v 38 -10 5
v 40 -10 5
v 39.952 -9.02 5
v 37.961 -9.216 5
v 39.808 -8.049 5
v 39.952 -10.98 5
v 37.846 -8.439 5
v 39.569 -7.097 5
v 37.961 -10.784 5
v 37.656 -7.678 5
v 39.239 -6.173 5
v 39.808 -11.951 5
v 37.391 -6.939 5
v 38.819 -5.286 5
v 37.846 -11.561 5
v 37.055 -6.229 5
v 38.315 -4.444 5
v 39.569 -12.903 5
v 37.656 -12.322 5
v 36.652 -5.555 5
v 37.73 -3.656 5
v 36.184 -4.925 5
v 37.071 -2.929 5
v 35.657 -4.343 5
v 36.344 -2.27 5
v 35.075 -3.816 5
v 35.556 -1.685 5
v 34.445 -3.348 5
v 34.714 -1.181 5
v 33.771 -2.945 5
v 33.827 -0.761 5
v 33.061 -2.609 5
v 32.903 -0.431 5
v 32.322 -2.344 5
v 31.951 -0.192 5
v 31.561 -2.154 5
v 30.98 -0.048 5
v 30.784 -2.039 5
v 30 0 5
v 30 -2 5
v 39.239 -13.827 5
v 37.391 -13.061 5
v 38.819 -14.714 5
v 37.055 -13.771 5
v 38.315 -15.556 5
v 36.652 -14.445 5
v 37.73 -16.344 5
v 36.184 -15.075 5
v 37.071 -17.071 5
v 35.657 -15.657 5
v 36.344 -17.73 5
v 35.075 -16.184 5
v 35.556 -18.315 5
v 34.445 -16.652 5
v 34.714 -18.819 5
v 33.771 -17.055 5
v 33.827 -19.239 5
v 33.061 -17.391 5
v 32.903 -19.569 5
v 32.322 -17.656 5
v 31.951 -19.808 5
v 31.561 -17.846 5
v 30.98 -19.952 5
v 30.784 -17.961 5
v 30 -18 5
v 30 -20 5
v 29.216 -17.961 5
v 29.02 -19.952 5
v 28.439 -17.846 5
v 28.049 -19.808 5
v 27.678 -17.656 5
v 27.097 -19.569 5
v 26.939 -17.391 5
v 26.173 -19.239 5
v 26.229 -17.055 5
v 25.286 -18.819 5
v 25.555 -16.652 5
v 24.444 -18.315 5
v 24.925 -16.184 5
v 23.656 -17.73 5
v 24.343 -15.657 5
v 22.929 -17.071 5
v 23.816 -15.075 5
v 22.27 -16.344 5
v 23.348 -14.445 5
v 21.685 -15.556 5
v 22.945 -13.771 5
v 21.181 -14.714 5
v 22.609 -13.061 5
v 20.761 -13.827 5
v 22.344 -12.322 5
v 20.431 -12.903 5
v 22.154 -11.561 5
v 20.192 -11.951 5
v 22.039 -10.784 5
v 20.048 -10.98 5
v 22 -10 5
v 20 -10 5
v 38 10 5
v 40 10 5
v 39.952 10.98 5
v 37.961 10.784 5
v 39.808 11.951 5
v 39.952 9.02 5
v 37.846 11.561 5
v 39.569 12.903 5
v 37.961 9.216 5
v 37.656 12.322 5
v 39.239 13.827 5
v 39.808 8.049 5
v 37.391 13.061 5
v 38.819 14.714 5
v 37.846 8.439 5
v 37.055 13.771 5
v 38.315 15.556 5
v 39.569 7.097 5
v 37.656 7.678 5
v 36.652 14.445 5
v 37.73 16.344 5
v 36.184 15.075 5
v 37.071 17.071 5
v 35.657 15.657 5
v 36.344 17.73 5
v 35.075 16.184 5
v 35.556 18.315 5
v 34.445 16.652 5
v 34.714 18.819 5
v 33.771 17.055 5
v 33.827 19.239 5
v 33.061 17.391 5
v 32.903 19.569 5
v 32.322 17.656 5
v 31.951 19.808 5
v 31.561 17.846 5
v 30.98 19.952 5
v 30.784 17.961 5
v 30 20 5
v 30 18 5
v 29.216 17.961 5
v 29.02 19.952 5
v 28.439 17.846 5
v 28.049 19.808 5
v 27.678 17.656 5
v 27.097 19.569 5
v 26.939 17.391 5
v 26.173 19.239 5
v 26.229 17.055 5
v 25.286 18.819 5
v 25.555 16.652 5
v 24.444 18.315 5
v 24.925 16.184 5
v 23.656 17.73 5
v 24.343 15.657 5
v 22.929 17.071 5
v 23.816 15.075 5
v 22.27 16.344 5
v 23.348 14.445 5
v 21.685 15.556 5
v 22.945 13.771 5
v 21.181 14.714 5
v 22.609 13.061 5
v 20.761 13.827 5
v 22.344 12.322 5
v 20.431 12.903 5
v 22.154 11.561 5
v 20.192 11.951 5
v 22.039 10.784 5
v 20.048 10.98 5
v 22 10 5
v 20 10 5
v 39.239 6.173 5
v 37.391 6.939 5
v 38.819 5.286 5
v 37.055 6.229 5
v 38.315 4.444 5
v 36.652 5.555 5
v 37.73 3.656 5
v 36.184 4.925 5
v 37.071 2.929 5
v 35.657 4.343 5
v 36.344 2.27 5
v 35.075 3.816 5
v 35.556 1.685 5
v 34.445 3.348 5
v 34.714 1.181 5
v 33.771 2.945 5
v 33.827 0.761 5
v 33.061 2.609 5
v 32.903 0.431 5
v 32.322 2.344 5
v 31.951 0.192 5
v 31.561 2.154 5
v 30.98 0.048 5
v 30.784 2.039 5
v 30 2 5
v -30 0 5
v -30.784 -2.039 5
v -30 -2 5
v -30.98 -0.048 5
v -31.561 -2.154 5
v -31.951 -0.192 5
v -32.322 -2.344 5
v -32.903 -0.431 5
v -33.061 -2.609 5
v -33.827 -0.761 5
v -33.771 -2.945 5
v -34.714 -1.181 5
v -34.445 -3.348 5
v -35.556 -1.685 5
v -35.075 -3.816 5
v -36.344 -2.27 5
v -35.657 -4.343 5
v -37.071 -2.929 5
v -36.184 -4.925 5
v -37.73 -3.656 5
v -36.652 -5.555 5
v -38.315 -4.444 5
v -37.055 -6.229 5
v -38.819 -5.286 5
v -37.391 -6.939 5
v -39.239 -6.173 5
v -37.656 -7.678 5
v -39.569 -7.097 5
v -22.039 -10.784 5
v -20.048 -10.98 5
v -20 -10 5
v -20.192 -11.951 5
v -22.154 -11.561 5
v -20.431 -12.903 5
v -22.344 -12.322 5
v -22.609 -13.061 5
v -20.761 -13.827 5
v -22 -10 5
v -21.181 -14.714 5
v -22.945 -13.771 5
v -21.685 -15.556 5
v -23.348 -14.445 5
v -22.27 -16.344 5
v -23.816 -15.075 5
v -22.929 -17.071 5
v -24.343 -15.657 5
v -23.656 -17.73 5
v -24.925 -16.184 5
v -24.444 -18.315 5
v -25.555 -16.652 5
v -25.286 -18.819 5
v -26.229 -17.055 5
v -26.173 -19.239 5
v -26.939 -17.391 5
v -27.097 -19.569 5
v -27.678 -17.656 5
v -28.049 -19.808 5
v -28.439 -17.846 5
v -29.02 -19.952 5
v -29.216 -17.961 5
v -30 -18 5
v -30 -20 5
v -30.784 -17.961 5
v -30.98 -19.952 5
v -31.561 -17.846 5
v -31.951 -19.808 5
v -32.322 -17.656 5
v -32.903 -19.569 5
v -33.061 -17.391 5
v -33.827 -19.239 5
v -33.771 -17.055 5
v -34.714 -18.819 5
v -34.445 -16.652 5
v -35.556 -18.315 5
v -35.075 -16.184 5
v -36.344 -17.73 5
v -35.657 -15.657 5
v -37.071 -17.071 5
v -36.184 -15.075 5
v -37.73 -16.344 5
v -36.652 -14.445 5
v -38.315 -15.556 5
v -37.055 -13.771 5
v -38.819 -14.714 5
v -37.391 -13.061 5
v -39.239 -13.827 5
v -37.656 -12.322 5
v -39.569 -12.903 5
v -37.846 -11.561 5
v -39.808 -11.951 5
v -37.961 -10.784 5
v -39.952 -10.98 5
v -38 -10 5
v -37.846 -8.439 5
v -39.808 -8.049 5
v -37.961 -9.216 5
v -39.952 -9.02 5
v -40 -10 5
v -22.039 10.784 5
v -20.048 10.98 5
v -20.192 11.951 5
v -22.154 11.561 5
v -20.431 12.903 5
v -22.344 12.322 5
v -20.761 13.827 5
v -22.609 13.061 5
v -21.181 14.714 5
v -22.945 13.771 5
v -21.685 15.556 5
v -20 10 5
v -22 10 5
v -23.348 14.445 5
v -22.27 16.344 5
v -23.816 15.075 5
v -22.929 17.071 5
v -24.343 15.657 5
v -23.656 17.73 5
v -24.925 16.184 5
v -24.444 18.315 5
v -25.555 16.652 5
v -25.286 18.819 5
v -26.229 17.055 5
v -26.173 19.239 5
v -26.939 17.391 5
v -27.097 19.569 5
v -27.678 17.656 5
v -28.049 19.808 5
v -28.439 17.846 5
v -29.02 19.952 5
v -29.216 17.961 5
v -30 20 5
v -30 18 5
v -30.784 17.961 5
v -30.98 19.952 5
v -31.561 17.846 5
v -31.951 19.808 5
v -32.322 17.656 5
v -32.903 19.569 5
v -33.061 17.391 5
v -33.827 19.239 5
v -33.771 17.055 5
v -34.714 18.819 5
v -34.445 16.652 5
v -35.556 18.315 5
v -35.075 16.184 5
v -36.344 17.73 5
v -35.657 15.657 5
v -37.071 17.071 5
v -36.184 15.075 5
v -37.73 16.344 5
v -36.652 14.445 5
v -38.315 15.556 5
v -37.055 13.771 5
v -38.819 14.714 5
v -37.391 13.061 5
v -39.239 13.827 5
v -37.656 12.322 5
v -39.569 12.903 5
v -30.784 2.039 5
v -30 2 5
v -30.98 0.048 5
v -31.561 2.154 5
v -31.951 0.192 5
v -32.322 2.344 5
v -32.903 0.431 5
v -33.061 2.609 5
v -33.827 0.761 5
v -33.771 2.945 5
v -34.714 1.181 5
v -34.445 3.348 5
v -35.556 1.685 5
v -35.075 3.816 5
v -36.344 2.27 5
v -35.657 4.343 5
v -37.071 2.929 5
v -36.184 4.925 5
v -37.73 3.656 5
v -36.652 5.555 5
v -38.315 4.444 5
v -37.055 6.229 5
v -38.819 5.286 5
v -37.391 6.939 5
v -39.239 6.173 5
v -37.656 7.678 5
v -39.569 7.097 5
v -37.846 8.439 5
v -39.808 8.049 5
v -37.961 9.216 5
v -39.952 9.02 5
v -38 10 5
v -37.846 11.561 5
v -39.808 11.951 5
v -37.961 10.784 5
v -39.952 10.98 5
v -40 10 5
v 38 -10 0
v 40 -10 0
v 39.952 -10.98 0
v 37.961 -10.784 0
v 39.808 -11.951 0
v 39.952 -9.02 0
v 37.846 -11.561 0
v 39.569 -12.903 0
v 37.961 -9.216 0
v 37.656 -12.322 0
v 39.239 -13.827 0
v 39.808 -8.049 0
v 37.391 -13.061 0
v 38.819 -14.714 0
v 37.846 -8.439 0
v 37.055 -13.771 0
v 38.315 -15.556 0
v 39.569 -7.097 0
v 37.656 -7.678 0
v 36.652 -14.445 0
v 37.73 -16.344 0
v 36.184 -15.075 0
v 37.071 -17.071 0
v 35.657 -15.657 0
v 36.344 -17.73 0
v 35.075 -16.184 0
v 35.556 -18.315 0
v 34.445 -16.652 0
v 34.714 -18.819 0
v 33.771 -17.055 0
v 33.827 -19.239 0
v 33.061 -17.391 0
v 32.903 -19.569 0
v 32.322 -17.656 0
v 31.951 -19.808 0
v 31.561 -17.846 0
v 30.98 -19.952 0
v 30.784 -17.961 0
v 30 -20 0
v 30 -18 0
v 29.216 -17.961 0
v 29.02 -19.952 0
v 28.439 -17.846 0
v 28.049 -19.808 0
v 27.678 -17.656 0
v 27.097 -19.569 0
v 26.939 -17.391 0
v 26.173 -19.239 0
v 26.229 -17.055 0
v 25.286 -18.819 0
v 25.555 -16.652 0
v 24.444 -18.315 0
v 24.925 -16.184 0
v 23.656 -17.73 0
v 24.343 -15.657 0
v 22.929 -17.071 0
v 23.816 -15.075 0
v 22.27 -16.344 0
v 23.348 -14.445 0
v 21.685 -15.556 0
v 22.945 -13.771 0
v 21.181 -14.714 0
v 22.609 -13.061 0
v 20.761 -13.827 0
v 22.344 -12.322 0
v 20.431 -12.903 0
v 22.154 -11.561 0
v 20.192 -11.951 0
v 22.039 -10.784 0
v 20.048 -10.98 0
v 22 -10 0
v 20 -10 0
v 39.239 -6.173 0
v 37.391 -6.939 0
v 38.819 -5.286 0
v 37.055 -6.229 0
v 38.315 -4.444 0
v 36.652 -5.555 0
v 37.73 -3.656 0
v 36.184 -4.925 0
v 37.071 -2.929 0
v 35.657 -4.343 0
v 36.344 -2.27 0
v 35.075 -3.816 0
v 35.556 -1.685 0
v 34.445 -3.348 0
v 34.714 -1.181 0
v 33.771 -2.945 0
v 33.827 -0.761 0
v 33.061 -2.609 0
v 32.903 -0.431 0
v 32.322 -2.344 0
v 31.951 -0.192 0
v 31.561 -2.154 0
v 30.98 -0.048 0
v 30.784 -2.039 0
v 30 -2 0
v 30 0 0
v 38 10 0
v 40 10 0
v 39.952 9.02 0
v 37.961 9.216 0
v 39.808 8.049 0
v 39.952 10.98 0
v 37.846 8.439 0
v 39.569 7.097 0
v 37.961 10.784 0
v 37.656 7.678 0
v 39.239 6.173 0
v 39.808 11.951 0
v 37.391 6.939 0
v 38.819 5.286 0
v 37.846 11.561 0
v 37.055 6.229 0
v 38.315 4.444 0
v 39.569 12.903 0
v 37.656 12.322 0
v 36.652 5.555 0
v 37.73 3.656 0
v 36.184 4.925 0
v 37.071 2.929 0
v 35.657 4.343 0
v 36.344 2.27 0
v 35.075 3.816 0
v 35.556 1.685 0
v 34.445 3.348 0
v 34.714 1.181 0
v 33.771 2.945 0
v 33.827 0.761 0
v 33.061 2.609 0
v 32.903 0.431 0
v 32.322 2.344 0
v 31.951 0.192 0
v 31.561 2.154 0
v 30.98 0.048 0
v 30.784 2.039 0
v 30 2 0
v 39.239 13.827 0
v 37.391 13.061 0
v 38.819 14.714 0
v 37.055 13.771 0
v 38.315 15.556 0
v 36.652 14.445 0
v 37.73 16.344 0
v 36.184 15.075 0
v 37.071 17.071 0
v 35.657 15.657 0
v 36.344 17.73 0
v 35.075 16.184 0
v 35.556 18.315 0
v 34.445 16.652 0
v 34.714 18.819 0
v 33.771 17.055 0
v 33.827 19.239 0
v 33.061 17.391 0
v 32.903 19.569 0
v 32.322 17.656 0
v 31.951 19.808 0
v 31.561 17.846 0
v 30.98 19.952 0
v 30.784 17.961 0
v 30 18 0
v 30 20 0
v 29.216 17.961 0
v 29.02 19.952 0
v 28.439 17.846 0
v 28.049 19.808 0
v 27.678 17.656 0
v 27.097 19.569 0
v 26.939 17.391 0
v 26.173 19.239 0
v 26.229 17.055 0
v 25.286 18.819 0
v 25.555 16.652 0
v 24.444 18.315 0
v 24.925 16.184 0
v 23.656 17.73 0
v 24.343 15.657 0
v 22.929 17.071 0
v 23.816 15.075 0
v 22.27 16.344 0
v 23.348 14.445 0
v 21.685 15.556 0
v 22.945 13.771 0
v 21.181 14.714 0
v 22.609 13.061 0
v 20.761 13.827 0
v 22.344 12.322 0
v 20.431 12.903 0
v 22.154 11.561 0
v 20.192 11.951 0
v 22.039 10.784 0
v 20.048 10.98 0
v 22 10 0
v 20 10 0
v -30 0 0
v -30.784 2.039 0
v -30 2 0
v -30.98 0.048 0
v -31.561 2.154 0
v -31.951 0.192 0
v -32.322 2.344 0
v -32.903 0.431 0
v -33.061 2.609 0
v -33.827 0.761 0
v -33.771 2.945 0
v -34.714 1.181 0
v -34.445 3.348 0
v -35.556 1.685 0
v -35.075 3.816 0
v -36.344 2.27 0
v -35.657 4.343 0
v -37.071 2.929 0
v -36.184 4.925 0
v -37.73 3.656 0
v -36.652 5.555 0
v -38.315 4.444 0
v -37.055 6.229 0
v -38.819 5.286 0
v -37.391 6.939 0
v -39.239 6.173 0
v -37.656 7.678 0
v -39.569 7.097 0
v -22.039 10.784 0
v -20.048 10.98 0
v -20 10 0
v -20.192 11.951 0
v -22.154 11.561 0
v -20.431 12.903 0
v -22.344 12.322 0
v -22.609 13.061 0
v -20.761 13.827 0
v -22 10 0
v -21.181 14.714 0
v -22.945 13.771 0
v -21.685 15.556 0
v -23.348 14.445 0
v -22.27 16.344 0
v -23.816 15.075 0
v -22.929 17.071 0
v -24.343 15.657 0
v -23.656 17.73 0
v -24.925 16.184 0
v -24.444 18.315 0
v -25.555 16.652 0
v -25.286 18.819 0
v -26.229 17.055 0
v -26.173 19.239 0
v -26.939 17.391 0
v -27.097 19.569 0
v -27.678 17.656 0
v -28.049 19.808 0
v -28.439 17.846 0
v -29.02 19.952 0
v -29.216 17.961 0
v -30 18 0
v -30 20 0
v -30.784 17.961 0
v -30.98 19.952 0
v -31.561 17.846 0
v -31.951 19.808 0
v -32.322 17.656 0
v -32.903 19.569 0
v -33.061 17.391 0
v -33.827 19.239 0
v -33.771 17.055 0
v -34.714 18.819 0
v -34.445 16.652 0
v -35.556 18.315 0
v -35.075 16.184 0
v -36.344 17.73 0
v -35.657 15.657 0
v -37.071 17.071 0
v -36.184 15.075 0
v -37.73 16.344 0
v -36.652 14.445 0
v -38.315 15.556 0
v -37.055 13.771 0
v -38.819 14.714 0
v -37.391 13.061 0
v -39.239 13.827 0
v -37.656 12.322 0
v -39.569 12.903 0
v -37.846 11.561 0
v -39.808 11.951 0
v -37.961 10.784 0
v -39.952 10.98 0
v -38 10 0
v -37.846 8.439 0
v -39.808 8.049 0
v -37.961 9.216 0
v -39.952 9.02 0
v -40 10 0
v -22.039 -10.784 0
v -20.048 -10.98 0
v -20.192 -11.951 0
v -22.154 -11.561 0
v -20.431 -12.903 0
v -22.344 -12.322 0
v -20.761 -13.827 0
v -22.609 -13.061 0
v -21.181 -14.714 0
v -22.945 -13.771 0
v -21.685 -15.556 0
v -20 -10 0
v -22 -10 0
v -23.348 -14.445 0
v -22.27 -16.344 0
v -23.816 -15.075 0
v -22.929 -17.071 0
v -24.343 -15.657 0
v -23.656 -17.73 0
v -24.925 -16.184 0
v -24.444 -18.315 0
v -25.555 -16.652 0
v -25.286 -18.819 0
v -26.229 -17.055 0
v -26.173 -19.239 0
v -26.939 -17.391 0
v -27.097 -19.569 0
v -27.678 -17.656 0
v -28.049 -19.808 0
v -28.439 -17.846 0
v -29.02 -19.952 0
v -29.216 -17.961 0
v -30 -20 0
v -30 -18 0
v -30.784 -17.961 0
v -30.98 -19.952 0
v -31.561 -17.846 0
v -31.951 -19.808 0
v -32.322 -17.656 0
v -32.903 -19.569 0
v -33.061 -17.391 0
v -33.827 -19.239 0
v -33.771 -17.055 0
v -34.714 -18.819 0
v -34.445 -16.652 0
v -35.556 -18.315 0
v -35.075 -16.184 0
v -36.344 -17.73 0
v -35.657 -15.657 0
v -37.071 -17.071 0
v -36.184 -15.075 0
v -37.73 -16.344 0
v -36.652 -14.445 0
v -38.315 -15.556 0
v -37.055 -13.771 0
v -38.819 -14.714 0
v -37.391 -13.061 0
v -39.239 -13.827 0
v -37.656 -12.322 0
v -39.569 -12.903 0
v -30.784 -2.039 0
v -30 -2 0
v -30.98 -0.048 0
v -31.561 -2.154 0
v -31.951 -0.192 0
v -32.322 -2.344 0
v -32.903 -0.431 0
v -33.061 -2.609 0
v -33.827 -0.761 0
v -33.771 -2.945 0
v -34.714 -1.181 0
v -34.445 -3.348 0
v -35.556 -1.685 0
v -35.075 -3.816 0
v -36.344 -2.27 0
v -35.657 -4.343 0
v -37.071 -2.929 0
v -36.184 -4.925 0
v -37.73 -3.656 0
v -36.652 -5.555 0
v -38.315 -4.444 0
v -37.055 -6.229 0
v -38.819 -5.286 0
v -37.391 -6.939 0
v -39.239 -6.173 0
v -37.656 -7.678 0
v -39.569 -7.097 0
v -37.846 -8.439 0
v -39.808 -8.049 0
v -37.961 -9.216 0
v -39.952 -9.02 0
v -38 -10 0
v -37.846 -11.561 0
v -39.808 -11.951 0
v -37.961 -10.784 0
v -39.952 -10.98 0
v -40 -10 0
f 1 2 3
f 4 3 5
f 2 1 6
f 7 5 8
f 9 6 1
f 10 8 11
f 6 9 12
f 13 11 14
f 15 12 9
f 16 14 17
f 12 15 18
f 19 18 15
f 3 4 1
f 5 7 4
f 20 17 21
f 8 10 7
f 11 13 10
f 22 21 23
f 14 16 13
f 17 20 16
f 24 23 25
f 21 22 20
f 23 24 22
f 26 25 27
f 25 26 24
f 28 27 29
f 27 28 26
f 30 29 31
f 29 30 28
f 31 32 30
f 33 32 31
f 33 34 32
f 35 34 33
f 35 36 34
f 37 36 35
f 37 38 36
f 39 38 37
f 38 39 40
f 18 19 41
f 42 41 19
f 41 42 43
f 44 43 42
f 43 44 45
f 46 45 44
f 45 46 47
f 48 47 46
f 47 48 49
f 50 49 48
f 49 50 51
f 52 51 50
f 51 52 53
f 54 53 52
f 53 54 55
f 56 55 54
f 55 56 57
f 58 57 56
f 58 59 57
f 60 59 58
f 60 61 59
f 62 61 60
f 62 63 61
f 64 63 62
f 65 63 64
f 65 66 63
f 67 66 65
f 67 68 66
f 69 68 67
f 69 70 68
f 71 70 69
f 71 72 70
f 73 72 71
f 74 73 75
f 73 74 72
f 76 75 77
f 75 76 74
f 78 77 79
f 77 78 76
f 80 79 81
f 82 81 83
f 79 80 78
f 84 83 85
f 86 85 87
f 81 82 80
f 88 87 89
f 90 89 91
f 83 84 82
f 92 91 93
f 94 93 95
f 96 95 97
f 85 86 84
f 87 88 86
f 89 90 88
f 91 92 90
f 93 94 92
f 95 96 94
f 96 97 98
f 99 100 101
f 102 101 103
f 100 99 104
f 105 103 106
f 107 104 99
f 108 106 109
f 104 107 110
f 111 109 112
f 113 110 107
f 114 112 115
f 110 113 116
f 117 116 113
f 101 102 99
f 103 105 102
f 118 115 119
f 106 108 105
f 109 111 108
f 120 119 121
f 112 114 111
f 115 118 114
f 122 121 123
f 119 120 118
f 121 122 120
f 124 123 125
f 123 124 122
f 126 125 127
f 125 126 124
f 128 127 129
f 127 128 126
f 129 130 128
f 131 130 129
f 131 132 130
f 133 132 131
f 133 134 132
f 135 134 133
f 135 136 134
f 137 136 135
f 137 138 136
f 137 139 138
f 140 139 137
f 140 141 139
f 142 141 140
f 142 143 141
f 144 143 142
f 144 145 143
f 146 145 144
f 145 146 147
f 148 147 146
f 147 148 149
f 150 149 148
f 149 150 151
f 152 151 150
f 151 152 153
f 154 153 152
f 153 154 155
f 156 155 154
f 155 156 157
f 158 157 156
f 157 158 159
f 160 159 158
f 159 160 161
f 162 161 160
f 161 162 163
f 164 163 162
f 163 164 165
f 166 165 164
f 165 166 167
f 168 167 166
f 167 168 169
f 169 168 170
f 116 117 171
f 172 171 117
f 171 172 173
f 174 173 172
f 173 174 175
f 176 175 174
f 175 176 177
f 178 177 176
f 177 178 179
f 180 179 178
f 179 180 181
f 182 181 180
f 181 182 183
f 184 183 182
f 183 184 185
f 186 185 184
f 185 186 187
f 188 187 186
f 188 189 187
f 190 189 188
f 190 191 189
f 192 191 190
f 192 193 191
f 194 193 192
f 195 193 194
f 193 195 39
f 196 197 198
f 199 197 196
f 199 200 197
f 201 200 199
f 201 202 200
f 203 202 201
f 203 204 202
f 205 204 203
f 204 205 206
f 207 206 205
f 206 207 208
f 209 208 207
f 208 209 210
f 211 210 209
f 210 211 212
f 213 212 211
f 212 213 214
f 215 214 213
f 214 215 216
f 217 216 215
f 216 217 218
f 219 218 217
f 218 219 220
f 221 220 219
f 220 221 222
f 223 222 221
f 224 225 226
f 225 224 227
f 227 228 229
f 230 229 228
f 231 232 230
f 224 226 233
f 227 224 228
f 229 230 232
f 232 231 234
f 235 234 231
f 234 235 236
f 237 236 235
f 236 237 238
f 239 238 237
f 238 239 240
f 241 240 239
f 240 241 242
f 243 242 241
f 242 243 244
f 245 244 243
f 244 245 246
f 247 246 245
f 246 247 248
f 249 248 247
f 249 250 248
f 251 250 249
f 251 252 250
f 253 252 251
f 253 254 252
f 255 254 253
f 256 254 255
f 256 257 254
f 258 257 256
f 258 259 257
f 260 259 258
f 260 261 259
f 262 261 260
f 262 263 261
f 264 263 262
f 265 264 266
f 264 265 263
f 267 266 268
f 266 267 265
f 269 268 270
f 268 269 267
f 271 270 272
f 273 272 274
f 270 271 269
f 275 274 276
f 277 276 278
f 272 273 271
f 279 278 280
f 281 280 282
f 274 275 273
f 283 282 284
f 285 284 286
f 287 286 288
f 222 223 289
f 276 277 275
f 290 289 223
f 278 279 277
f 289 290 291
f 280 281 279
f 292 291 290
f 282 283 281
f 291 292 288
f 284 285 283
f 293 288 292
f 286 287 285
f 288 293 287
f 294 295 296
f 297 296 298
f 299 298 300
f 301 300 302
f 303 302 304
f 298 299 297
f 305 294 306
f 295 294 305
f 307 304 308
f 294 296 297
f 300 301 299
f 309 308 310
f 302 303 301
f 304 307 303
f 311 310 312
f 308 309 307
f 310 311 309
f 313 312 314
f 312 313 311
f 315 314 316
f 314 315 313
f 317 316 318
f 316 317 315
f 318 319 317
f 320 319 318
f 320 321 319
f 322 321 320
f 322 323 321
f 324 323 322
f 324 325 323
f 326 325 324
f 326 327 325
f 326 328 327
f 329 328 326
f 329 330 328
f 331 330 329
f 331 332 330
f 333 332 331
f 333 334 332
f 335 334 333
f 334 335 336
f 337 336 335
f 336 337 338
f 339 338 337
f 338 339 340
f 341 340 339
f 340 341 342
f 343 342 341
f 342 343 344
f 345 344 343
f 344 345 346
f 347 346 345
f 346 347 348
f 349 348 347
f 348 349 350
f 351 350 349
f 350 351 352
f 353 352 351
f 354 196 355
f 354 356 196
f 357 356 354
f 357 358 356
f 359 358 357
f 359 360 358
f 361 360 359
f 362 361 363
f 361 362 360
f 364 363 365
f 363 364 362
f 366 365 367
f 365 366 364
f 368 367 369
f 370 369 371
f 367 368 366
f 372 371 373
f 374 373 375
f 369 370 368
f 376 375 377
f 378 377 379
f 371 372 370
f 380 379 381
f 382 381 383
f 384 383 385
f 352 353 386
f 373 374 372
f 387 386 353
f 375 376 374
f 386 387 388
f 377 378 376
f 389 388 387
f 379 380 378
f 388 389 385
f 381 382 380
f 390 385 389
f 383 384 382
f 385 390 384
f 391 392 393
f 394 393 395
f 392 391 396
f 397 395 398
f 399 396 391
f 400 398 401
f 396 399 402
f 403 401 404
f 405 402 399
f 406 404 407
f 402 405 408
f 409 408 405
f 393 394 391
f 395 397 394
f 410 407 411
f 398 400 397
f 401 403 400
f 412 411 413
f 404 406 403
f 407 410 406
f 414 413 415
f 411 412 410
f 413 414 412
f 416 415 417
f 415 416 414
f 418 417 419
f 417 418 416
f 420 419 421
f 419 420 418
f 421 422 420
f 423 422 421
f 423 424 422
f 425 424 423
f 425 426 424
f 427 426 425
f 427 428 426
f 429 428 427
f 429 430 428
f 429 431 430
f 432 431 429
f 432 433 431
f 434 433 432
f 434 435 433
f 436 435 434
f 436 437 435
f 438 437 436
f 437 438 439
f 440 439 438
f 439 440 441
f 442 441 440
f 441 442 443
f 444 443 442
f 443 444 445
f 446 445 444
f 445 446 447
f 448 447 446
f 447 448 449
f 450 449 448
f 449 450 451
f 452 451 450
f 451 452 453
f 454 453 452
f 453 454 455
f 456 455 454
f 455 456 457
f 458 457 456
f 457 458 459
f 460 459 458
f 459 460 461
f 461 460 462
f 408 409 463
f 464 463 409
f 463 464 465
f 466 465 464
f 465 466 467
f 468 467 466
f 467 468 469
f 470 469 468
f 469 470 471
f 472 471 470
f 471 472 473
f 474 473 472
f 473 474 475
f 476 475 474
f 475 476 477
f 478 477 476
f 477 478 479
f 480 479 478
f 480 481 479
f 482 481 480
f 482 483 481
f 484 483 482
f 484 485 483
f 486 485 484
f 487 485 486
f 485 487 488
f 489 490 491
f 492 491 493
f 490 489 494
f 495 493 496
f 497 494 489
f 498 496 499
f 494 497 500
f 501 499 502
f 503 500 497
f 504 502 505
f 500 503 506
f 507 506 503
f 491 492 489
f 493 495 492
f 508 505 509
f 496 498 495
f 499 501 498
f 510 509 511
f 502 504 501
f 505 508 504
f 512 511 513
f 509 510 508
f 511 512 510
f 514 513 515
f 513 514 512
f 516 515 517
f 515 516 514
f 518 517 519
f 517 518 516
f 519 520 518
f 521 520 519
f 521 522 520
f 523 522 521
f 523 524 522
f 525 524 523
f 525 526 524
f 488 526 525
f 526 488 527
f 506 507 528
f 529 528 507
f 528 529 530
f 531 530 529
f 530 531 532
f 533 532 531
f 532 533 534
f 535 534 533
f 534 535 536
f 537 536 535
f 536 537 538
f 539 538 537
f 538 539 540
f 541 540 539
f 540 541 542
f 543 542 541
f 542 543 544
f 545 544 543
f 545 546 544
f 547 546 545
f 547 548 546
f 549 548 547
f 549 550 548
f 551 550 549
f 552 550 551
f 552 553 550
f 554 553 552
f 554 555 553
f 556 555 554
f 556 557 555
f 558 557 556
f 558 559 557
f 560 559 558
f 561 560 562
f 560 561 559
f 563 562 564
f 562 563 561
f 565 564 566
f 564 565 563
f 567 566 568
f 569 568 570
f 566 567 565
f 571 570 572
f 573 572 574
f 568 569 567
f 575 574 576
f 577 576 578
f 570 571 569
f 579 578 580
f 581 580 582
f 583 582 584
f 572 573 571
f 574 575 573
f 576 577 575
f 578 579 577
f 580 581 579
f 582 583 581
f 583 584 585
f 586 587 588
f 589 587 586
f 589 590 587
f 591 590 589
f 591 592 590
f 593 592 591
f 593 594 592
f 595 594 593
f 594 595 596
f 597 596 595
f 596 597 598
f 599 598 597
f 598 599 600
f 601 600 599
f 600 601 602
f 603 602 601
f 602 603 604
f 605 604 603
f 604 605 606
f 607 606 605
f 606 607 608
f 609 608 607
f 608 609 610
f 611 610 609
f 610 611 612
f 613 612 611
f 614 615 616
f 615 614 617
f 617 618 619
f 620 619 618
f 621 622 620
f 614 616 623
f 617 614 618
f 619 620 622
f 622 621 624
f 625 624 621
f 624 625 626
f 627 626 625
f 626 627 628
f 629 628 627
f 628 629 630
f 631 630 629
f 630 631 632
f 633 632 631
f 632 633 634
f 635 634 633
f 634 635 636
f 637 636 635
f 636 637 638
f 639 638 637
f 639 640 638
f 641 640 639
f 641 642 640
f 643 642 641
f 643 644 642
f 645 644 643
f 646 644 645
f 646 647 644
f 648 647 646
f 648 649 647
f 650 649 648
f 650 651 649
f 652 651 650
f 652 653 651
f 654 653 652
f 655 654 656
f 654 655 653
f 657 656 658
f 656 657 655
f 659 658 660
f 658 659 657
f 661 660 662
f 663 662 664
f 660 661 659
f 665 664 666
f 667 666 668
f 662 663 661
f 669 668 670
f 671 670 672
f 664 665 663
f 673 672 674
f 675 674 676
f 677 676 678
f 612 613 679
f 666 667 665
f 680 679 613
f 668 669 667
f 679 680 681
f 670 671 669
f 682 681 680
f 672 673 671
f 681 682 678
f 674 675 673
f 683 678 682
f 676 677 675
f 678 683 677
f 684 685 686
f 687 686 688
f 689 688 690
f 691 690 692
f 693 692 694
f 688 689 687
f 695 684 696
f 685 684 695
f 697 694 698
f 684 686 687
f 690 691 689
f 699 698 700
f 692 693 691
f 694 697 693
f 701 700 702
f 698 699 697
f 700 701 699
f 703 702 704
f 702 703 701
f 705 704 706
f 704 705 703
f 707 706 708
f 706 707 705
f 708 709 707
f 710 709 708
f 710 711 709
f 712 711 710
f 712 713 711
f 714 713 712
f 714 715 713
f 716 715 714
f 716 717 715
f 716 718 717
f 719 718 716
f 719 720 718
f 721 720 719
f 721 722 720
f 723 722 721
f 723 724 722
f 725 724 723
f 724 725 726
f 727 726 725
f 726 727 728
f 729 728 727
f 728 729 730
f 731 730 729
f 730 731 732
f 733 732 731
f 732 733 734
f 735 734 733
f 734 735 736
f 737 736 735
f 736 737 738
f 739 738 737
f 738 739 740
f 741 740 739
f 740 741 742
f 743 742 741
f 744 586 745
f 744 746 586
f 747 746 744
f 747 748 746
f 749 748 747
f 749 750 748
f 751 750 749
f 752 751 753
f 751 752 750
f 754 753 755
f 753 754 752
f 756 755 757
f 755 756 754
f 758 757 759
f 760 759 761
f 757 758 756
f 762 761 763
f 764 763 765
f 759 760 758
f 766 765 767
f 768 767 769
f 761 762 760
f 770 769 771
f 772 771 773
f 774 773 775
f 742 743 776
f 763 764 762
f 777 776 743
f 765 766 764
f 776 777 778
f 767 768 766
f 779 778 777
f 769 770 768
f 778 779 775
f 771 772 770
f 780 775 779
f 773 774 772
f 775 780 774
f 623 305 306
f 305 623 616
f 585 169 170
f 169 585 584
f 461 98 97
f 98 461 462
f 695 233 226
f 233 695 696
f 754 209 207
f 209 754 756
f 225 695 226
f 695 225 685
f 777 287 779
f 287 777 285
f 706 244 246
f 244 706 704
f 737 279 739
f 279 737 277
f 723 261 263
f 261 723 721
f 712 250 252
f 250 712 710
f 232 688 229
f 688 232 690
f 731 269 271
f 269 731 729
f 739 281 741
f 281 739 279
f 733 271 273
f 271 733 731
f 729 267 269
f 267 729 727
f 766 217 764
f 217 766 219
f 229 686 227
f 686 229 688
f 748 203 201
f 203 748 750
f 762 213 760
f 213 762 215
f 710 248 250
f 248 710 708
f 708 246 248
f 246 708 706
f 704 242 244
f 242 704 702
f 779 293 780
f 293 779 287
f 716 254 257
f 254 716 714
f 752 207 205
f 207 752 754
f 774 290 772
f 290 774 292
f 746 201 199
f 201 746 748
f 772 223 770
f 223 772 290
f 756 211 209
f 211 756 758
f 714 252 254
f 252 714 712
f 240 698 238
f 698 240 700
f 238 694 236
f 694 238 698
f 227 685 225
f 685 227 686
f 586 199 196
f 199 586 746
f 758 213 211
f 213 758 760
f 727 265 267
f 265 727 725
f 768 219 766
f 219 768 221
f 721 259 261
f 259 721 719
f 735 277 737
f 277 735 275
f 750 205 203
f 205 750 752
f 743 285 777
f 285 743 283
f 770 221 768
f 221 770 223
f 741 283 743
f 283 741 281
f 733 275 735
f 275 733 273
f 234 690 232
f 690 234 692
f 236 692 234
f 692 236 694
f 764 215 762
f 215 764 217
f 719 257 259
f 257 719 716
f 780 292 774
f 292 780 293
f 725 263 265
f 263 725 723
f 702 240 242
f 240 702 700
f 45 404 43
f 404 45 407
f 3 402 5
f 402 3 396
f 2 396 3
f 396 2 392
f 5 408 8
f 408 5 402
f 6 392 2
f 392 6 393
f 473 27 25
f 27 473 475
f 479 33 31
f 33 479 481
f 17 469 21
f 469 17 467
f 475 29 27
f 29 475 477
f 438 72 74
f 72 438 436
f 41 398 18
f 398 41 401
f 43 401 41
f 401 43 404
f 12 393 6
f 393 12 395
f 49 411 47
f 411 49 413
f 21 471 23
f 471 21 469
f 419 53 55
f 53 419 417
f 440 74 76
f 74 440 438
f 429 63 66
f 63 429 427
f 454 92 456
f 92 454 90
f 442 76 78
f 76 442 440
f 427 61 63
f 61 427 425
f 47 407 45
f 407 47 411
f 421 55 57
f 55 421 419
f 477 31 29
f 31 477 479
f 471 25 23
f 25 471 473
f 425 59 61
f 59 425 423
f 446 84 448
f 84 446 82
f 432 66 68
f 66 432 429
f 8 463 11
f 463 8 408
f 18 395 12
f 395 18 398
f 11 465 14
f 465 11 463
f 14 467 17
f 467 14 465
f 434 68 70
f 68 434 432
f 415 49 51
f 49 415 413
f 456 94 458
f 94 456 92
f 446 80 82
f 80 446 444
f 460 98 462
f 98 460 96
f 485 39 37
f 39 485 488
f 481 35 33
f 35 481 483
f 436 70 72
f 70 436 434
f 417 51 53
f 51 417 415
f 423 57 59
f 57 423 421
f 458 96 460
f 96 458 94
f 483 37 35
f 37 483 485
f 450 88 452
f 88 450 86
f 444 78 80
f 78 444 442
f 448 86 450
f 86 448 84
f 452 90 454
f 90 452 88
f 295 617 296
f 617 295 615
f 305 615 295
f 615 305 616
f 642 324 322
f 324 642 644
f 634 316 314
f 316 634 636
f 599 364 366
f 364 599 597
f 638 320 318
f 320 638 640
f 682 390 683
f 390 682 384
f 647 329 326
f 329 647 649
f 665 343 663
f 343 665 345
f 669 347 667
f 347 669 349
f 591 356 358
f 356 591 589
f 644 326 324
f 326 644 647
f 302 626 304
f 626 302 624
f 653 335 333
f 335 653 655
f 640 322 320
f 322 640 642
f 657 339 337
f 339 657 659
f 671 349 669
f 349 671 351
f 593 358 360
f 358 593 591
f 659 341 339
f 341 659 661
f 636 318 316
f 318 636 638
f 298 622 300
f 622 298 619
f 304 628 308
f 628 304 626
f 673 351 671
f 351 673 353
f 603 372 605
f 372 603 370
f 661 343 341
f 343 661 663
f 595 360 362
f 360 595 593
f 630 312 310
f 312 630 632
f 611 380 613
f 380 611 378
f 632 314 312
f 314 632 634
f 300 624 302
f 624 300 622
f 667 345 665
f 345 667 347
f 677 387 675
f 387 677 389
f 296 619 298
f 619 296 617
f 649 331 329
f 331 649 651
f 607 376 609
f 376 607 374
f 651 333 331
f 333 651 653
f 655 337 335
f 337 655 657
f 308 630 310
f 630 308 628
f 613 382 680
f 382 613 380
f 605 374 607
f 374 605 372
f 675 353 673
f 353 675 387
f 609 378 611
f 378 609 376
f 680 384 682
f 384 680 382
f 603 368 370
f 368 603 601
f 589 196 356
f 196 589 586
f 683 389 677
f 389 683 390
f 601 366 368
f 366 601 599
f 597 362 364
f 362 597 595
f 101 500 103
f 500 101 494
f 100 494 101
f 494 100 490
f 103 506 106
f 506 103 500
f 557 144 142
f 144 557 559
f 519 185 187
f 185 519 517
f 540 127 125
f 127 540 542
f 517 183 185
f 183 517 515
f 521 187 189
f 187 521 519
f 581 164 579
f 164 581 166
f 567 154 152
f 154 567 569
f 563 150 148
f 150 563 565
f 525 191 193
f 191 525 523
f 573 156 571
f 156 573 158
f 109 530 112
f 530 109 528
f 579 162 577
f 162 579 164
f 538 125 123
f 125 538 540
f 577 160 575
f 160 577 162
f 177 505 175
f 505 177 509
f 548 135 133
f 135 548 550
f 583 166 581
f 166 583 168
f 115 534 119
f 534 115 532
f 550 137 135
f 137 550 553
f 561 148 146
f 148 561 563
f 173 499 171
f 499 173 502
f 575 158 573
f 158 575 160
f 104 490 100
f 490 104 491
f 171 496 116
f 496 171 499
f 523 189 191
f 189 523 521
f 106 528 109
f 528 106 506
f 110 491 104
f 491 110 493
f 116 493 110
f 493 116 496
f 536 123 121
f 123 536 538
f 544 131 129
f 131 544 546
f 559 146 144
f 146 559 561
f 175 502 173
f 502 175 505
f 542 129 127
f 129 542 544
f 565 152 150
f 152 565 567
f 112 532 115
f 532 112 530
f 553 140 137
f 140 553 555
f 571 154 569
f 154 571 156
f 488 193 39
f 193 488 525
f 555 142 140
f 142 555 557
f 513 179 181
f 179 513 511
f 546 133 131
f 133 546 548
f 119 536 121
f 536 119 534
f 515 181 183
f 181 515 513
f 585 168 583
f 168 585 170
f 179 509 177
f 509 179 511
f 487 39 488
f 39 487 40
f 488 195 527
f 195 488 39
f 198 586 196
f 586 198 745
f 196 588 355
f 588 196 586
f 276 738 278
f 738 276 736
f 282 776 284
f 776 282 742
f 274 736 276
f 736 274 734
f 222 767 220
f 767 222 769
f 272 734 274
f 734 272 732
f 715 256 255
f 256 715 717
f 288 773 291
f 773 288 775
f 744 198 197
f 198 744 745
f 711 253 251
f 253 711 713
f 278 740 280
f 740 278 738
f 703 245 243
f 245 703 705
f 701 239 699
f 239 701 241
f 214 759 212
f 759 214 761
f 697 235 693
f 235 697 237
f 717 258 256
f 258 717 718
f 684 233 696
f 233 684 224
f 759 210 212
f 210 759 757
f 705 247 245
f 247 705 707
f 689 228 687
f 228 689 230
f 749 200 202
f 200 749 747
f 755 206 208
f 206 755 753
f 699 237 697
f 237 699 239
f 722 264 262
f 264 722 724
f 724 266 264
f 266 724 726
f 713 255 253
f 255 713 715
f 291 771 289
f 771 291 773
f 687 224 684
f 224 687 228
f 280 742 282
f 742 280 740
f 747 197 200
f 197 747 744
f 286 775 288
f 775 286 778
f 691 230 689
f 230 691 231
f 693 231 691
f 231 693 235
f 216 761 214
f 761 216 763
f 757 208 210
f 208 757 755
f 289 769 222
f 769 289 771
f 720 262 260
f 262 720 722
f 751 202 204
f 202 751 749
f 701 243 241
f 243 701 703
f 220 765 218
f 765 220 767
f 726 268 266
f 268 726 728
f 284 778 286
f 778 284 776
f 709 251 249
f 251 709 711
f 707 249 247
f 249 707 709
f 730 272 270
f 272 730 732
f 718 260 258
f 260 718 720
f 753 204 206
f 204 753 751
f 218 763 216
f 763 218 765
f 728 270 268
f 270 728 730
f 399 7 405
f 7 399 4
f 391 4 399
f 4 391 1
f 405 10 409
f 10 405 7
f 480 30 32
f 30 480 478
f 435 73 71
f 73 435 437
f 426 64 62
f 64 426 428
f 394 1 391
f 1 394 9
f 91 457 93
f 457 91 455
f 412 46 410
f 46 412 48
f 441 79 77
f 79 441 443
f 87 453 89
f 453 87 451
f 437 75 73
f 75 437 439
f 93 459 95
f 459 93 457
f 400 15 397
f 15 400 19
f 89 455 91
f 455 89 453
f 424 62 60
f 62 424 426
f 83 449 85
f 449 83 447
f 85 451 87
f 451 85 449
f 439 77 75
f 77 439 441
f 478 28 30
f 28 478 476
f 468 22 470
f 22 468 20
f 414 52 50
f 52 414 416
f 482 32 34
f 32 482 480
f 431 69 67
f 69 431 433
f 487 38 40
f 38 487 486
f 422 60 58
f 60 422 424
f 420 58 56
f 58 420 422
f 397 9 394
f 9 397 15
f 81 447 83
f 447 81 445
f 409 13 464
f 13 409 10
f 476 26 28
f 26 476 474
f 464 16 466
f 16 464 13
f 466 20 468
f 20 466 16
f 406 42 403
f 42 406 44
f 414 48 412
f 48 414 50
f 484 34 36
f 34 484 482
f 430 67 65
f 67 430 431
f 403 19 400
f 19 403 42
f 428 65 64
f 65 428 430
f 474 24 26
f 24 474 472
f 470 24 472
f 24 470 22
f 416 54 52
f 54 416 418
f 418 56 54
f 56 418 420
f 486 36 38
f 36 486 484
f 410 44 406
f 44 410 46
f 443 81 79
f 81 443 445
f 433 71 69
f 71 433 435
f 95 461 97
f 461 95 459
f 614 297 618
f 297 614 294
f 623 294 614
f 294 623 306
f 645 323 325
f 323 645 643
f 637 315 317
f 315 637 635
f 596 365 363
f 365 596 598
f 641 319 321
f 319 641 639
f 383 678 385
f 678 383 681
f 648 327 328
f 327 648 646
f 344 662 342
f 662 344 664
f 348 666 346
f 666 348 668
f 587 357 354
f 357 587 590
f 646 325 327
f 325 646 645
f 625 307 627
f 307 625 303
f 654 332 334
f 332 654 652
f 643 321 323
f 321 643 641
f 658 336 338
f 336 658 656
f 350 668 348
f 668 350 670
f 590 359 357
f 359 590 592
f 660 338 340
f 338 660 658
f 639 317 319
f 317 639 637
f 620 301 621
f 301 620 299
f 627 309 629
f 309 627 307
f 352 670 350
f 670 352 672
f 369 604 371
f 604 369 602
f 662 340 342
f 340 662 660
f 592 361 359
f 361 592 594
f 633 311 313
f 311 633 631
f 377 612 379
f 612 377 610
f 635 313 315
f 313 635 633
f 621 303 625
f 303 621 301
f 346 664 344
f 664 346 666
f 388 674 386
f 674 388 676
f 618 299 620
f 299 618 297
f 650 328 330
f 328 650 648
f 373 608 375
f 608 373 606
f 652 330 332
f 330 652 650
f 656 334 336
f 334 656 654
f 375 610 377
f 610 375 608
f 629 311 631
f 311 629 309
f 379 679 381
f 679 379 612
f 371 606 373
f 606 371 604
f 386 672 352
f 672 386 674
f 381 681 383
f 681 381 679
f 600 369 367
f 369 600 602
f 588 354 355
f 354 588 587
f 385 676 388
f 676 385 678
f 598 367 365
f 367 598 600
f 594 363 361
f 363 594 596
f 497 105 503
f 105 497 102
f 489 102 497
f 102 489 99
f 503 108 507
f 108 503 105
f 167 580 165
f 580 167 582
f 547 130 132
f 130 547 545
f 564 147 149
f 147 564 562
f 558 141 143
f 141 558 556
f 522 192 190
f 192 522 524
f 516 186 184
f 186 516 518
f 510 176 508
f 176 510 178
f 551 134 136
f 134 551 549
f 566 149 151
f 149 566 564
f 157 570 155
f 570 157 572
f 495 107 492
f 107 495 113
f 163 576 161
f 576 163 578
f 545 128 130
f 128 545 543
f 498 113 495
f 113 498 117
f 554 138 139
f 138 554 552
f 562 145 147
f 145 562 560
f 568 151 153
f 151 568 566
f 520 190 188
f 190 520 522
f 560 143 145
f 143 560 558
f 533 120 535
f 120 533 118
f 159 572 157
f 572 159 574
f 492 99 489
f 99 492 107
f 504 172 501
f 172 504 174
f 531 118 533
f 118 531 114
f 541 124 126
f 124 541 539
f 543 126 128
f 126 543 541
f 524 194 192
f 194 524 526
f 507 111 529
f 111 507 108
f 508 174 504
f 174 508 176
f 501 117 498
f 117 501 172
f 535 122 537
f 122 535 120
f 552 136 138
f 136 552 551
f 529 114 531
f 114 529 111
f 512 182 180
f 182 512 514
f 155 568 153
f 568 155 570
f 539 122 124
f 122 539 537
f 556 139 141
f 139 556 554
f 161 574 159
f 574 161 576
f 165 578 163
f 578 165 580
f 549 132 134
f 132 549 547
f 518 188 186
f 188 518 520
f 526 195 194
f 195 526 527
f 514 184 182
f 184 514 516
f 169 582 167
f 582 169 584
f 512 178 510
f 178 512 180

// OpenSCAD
module d_connector() {
    difference() {
        union() {
            // Main body
            translate([-30, -10, 0])
            cube([60, 20, 5]);

            // Rounded edges
            translate([-30, -10, 0])
            cylinder(h=5, r=10, $fn=64);
            translate([30, -10, 0])
            cylinder(h=5, r=10, $fn=64);
            translate([-30, 10, 0])
            cylinder(h=5, r=10, $fn=64);
            translate([30, 10, 0])
            cylinder(h=5, r=10, $fn=64);
        }
        
        // Cut out the inner part to form the D shape
        translate([-30, -10, -1])
        cube([60, 20, 6]);

        translate([-30, -10, 0])
        cylinder(h=6, r=8, $fn=64);
        translate([30, -10, 0])
        cylinder(h=6, r=8, $fn=64);
        translate([-30, 10, 0])
        cylinder(h=6, r=8, $fn=64);
        translate([30, 10, 0])
        cylinder(h=6, r=8, $fn=64);
    }
}

d_connector();
